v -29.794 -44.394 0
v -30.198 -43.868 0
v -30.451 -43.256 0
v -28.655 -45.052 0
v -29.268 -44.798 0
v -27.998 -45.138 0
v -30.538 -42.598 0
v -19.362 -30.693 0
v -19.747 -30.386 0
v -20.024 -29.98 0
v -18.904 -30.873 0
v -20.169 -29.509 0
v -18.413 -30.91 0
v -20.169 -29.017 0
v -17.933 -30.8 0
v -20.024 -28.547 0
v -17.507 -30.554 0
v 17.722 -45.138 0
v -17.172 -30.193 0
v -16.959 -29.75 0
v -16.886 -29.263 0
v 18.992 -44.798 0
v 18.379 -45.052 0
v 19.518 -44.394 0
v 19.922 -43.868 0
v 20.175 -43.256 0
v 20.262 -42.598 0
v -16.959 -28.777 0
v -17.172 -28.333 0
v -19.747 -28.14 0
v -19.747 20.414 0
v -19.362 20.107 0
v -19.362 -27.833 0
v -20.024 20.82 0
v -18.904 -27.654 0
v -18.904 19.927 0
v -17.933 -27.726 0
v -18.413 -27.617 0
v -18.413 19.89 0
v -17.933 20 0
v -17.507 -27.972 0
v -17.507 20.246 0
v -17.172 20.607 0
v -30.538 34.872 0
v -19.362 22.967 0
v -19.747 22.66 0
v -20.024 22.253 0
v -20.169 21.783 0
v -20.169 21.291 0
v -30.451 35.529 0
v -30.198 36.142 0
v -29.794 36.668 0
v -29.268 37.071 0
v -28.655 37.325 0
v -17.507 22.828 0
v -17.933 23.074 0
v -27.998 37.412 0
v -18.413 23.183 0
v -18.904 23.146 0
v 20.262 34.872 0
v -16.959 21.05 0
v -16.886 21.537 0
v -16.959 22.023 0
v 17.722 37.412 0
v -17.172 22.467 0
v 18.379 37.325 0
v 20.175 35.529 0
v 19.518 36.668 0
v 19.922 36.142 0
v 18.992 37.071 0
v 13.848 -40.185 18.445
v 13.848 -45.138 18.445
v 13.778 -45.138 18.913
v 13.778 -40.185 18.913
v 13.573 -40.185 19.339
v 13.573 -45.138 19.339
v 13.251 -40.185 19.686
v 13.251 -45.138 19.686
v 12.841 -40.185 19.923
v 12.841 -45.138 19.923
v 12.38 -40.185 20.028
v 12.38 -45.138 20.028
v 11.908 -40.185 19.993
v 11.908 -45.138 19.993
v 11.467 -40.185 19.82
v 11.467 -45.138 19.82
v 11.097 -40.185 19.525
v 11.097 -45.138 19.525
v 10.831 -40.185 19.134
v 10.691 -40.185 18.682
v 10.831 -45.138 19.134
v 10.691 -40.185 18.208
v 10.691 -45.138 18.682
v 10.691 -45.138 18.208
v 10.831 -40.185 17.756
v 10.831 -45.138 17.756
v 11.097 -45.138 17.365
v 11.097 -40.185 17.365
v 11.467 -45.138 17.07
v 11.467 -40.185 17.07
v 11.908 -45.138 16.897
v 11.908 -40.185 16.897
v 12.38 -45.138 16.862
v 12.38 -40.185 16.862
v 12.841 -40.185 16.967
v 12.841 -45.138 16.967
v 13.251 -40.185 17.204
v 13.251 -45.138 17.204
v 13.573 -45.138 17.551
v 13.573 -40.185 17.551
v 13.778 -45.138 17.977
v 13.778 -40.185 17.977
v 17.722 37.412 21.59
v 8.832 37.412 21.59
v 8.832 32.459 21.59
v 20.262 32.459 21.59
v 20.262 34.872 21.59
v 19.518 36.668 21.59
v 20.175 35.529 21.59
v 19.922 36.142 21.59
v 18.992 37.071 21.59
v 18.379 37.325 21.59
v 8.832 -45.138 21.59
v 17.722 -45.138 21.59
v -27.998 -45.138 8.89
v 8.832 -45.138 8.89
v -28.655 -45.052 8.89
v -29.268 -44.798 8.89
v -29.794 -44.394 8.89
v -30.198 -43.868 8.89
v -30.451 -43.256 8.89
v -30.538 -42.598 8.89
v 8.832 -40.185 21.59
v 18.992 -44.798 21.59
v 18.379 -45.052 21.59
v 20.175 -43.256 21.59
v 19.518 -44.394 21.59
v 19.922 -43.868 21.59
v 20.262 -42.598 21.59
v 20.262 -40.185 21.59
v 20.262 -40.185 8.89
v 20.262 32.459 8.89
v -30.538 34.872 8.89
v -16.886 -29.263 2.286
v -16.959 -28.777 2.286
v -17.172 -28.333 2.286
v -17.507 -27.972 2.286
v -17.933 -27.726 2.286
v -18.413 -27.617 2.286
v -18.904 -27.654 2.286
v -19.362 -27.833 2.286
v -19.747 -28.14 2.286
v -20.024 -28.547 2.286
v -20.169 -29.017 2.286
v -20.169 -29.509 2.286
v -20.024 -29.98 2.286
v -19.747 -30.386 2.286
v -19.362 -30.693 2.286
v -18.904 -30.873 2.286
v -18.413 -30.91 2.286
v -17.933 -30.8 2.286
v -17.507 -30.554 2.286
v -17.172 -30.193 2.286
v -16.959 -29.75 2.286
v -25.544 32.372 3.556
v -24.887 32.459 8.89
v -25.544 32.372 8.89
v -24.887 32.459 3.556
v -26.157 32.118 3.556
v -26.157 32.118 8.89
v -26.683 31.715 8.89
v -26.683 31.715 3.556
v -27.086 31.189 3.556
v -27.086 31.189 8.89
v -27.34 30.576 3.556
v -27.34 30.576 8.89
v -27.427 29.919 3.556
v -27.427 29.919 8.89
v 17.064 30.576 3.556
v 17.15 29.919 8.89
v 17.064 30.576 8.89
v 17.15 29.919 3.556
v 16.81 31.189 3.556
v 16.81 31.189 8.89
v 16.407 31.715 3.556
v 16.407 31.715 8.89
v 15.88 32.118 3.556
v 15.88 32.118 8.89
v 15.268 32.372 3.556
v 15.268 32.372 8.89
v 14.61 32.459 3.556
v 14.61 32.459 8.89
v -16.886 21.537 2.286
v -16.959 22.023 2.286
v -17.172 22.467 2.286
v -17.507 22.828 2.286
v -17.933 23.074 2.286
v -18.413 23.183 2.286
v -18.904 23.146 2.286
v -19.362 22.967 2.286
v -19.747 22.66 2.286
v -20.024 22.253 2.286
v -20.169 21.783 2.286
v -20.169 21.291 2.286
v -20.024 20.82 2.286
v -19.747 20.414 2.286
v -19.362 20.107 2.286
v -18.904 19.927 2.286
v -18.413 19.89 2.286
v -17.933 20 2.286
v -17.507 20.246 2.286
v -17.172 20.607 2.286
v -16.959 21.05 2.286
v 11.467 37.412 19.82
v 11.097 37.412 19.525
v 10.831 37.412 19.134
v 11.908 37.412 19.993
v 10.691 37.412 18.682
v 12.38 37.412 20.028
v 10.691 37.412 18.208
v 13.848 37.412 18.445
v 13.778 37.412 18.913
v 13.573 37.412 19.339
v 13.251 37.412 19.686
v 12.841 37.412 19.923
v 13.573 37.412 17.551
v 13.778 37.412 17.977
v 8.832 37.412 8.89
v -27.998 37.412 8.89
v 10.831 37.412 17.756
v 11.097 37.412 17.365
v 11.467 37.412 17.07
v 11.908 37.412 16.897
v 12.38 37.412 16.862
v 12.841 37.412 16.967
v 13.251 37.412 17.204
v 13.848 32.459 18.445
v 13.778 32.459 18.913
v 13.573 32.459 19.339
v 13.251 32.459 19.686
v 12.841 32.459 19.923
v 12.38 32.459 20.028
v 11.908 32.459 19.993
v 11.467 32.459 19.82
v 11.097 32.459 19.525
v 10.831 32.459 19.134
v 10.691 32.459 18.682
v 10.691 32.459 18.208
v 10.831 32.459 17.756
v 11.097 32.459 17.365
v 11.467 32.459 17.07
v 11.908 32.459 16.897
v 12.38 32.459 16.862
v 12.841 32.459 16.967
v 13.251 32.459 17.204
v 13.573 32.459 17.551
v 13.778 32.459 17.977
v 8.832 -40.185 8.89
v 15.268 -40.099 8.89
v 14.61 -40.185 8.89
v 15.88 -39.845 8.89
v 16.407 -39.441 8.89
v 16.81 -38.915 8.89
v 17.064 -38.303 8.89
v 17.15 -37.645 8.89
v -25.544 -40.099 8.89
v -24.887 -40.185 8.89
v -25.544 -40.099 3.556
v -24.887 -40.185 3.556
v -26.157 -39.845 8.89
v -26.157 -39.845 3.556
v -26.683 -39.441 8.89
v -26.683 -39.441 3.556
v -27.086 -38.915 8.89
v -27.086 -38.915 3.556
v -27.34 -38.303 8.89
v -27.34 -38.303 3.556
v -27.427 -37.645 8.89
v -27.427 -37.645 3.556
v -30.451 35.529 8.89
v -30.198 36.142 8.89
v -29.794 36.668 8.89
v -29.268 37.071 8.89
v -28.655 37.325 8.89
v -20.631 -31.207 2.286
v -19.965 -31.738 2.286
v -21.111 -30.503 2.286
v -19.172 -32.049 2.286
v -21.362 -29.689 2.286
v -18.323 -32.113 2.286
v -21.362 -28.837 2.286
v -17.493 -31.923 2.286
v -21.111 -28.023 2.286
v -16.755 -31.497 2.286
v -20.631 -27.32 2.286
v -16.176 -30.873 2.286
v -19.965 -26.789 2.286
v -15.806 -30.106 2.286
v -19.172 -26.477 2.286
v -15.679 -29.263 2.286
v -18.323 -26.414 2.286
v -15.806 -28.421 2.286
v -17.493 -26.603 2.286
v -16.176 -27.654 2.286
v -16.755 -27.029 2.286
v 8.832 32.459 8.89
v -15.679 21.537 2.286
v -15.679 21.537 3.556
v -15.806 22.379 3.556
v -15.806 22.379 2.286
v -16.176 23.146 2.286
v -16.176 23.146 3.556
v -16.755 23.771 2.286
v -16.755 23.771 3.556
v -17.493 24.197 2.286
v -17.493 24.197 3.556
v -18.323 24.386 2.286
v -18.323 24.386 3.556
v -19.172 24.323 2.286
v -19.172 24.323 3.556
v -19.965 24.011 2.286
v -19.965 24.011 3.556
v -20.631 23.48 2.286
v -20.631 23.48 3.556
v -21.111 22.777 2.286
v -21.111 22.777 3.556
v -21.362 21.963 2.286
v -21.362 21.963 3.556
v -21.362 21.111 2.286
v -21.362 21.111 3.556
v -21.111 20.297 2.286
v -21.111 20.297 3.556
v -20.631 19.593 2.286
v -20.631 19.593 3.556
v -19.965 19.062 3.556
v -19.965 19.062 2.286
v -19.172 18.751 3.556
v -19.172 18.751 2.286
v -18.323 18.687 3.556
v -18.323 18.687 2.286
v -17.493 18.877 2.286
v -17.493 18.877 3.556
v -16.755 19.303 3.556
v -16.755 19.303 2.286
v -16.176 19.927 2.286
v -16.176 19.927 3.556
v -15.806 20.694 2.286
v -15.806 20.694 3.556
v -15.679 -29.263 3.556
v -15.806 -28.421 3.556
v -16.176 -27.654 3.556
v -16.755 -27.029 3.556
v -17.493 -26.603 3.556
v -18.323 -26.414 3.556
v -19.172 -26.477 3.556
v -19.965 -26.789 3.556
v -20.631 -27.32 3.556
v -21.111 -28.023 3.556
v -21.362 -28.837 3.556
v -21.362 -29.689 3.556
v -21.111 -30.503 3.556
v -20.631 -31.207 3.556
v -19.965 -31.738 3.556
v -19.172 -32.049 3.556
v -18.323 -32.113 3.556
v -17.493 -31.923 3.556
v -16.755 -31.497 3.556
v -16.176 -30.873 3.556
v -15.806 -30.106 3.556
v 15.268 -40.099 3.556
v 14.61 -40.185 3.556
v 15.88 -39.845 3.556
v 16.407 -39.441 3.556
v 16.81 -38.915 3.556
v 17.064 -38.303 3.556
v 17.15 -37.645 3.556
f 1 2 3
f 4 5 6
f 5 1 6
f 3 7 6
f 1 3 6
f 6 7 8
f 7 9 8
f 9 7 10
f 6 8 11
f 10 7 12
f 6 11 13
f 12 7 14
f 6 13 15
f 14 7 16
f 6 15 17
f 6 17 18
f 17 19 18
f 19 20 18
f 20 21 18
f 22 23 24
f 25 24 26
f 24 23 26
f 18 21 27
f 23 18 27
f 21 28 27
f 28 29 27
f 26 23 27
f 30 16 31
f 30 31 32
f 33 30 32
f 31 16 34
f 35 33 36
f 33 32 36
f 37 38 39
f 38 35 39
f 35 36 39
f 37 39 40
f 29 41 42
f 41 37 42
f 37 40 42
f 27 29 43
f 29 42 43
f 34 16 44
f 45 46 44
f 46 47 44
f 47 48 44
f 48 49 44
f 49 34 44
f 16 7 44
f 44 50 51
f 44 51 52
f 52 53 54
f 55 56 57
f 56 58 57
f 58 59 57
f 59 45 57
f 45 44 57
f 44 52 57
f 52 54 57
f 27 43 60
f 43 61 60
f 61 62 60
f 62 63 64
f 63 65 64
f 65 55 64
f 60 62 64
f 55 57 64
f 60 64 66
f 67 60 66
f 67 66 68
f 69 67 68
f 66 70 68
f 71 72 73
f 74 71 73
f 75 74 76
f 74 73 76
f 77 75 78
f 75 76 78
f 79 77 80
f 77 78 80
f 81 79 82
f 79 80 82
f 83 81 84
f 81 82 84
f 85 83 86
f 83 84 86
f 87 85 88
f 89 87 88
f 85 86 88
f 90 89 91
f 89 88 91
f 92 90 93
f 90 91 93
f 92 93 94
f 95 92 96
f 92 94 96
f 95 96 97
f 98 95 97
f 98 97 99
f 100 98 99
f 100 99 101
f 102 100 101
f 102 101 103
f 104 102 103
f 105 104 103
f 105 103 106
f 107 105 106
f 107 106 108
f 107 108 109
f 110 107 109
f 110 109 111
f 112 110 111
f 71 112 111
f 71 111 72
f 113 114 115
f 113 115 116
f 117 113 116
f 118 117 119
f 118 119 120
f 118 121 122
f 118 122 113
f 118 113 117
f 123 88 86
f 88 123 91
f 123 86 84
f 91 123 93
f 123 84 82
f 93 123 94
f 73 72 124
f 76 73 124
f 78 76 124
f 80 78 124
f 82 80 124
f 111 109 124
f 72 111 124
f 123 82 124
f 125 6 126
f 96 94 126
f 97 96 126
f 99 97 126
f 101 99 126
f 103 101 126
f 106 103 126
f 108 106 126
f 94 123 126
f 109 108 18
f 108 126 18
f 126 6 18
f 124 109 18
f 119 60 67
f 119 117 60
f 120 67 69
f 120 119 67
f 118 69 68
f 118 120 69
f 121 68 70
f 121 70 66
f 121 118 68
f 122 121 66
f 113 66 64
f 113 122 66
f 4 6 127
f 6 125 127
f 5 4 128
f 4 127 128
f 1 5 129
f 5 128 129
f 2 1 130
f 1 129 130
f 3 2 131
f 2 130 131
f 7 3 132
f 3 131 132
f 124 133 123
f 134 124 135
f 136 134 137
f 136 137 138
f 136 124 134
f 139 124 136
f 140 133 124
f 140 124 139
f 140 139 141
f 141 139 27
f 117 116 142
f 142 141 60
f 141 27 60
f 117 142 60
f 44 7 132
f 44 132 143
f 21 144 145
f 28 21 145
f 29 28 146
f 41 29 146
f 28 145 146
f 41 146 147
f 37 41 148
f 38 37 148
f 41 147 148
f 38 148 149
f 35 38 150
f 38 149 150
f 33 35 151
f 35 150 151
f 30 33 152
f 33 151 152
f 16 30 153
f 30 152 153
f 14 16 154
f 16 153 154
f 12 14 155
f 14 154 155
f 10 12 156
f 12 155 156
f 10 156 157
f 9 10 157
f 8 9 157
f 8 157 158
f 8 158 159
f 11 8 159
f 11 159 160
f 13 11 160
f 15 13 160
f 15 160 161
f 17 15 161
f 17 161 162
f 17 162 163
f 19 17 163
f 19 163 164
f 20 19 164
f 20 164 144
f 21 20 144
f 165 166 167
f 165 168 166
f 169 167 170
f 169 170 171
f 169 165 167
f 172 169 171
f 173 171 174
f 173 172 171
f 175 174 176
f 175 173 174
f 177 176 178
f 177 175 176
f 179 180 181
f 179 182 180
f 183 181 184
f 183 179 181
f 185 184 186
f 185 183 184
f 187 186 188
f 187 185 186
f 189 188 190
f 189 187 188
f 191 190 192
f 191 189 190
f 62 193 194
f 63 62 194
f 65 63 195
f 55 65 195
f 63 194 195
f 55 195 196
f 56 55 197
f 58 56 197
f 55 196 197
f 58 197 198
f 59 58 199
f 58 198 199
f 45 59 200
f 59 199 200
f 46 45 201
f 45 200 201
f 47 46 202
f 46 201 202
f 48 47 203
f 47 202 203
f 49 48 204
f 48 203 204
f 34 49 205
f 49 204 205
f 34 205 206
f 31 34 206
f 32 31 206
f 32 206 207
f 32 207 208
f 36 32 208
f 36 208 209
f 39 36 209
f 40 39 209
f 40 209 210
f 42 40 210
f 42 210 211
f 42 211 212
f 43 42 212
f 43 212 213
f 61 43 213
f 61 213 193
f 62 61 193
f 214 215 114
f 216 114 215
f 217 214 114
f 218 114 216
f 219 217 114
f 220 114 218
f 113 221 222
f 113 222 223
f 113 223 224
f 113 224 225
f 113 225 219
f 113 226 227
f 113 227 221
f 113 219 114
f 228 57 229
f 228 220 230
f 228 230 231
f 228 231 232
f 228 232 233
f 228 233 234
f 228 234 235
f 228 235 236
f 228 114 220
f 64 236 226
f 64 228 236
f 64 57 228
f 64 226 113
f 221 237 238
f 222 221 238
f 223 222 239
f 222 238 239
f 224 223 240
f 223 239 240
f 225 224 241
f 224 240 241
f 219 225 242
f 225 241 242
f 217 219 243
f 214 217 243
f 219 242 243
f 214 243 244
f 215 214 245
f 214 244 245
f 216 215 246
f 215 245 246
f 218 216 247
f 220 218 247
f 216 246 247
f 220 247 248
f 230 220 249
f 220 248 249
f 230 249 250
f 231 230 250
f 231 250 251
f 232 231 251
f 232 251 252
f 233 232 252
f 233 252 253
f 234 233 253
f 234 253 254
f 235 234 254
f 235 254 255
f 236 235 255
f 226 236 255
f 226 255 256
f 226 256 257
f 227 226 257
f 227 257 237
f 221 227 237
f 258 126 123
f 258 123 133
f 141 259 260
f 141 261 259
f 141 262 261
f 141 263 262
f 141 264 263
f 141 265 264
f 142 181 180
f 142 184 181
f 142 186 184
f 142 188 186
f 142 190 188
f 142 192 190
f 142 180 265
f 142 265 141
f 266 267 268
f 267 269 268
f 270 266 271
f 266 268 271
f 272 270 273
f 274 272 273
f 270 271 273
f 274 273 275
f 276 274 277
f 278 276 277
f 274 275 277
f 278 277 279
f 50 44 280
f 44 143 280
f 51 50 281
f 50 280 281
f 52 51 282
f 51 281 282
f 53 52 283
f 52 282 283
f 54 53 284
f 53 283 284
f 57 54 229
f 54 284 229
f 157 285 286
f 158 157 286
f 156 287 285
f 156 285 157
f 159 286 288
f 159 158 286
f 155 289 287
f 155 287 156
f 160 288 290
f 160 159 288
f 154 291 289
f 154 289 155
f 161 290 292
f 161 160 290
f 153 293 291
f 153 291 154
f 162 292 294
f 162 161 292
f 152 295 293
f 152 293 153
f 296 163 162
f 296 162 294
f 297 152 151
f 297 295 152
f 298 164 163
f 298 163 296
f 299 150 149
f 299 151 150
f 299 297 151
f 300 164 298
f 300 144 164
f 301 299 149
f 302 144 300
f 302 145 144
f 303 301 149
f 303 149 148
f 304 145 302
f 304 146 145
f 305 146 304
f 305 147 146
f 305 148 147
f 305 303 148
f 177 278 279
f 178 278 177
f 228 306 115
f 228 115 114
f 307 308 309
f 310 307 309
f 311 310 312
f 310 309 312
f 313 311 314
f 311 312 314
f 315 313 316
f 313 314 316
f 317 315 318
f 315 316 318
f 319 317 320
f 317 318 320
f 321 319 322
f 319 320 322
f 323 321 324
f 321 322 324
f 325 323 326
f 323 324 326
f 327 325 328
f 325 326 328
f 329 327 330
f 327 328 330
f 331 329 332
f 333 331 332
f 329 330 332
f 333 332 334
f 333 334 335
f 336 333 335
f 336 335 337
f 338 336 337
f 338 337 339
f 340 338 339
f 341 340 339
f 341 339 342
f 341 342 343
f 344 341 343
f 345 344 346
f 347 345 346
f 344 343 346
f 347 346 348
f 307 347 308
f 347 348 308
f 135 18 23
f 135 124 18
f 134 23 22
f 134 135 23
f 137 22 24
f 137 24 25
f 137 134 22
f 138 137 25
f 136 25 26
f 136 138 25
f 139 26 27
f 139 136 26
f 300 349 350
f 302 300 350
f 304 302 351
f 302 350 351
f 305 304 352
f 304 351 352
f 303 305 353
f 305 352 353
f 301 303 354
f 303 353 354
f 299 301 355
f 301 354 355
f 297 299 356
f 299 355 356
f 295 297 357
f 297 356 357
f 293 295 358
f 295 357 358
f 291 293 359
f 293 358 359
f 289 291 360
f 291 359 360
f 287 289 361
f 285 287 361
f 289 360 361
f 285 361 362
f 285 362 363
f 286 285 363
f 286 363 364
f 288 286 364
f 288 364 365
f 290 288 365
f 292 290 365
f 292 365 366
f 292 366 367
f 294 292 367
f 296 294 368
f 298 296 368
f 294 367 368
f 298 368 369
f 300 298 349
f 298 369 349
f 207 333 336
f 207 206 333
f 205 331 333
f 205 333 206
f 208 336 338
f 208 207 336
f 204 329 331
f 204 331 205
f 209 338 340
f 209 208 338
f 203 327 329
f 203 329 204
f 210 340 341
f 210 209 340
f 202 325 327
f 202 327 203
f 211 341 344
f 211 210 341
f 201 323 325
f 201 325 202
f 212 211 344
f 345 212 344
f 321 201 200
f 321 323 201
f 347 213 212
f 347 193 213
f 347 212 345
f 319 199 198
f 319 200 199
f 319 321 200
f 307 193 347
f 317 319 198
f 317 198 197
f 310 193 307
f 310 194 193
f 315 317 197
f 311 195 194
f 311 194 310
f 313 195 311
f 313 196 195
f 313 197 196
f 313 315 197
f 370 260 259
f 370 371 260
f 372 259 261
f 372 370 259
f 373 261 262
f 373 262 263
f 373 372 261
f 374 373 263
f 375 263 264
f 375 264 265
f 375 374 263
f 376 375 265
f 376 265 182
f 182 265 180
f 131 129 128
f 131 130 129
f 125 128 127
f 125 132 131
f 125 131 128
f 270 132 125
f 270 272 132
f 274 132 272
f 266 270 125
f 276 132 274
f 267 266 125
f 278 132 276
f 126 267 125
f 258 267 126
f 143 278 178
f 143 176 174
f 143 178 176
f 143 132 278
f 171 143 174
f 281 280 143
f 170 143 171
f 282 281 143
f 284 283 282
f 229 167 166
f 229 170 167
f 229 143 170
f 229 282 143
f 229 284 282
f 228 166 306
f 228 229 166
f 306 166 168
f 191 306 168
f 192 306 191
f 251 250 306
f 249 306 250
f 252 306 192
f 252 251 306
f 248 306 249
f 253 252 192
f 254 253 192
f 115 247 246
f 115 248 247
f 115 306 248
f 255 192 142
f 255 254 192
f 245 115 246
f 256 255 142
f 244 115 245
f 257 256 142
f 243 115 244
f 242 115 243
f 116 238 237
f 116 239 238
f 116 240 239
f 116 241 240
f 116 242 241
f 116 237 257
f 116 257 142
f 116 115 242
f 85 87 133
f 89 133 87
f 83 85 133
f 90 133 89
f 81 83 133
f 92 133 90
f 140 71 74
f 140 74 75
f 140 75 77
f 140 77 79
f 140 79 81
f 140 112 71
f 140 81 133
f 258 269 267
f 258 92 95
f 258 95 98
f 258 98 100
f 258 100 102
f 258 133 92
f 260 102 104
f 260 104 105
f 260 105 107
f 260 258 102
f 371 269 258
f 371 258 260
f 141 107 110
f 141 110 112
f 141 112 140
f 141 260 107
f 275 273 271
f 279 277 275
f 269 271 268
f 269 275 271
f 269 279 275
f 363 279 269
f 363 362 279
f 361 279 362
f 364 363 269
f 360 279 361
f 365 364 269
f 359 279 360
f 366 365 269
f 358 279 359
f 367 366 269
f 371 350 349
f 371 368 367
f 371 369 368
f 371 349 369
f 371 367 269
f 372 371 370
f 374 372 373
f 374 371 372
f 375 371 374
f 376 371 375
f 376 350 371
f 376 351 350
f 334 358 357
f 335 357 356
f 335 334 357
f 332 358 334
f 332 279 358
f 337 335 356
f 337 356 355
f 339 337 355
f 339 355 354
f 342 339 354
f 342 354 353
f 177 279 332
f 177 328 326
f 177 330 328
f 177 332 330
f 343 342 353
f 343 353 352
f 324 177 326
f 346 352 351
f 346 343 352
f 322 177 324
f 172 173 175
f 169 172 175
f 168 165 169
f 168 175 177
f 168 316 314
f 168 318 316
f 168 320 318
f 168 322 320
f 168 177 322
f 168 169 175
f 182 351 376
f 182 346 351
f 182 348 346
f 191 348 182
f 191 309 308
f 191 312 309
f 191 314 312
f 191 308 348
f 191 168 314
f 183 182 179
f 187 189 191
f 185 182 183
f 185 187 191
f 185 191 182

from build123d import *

# Parameters (mm, degrees)
F0_W      = 50.8
F0_H      = 82.55
F1_DEPTH  = 8.89
F2_W      = 44.577
F2_H      = 72.644
F3_DEPTH  = 5.334
F4_R      = 2.54
F5_R      = 1.651
F6_DEPTH  = 25.4
F7_R      = 2.8575
F8_DEPTH  = 1.27
F9_W      = 11.43
F9_H      = 4.953
F10_DEPTH = 12.7
F11_R     = 1.5875
F12_DEPTH = 127
F13_R     = 2.54


with BuildPart() as f1:
    # F0 (on Top) → F1 (new body)
    with BuildSketch(Plane.XY):
        with Locations((-5.138001, -3.863245)):
            Rectangle(F0_W, F0_H)
    extrude(amount=F1_DEPTH)

    # F2 (on face) → F3 (cut)
    with BuildSketch(Plane.XY.offset(8.89)):
        with Locations((-5.138001, -3.863245)):
            Rectangle(F2_W, F2_H)
    extrude(amount=-F3_DEPTH, mode=Mode.SUBTRACT)

    # F4
    f4_edges = [f1.edges().sort_by_distance(p)[0] for p in [
        (-27.426501, 32.458755, 6.223),
        (17.150499, 32.458755, 6.223),
        (17.150499, -40.185245, 6.223),
        (-27.426501, -40.185245, 6.223),
    ]]
    fillet(f4_edges, radius=F4_R)

    # F5 (on face) → F6 (cut)
    with BuildSketch(Plane.XY.offset(3.556)):
        with Locations((-18.536501, 21.536755)):
            Circle(F5_R)
        with Locations((-18.536501, -29.263245)):
            Circle(F5_R)
    extrude(amount=-F6_DEPTH, mode=Mode.SUBTRACT)

    # F7 (on face) → F8 (cut)
    with BuildSketch(Plane.XY.offset(3.556)):
        with Locations((-18.536501, 21.536755)):
            Circle(F7_R)
        with Locations((-18.536501, -29.263245)):
            Circle(F7_R)
    extrude(amount=-F8_DEPTH, mode=Mode.SUBTRACT)

    # F9 (on face) → F10 (join)
    with BuildSketch(Plane.XY.offset(8.89)):
        with Locations((14.546999, -42.661745)):
            Rectangle(F9_W, F9_H)
        with Locations((14.546999, 34.935255)):
            Rectangle(F9_W, F9_H)
    extrude(amount=F10_DEPTH)

    # F11 (on face) → F12 (cut)
    with BuildSketch(Plane.XZ.offset(45.138245)):
        with Locations((12.260999, 18.444914)):
            Circle(F11_R)
    extrude(amount=-F12_DEPTH, mode=Mode.SUBTRACT)

    # F13
    f13_edges = [f1.edges().sort_by_distance(p)[0] for p in [
        (20.261999, -45.138245, 10.795),
        (-30.538001, -45.138245, 4.445),
        (20.261999, 37.411755, 10.795),
        (-30.538001, 37.411755, 4.445),
    ]]
    fillet(f13_edges, radius=F13_R)


solid = f1.part
